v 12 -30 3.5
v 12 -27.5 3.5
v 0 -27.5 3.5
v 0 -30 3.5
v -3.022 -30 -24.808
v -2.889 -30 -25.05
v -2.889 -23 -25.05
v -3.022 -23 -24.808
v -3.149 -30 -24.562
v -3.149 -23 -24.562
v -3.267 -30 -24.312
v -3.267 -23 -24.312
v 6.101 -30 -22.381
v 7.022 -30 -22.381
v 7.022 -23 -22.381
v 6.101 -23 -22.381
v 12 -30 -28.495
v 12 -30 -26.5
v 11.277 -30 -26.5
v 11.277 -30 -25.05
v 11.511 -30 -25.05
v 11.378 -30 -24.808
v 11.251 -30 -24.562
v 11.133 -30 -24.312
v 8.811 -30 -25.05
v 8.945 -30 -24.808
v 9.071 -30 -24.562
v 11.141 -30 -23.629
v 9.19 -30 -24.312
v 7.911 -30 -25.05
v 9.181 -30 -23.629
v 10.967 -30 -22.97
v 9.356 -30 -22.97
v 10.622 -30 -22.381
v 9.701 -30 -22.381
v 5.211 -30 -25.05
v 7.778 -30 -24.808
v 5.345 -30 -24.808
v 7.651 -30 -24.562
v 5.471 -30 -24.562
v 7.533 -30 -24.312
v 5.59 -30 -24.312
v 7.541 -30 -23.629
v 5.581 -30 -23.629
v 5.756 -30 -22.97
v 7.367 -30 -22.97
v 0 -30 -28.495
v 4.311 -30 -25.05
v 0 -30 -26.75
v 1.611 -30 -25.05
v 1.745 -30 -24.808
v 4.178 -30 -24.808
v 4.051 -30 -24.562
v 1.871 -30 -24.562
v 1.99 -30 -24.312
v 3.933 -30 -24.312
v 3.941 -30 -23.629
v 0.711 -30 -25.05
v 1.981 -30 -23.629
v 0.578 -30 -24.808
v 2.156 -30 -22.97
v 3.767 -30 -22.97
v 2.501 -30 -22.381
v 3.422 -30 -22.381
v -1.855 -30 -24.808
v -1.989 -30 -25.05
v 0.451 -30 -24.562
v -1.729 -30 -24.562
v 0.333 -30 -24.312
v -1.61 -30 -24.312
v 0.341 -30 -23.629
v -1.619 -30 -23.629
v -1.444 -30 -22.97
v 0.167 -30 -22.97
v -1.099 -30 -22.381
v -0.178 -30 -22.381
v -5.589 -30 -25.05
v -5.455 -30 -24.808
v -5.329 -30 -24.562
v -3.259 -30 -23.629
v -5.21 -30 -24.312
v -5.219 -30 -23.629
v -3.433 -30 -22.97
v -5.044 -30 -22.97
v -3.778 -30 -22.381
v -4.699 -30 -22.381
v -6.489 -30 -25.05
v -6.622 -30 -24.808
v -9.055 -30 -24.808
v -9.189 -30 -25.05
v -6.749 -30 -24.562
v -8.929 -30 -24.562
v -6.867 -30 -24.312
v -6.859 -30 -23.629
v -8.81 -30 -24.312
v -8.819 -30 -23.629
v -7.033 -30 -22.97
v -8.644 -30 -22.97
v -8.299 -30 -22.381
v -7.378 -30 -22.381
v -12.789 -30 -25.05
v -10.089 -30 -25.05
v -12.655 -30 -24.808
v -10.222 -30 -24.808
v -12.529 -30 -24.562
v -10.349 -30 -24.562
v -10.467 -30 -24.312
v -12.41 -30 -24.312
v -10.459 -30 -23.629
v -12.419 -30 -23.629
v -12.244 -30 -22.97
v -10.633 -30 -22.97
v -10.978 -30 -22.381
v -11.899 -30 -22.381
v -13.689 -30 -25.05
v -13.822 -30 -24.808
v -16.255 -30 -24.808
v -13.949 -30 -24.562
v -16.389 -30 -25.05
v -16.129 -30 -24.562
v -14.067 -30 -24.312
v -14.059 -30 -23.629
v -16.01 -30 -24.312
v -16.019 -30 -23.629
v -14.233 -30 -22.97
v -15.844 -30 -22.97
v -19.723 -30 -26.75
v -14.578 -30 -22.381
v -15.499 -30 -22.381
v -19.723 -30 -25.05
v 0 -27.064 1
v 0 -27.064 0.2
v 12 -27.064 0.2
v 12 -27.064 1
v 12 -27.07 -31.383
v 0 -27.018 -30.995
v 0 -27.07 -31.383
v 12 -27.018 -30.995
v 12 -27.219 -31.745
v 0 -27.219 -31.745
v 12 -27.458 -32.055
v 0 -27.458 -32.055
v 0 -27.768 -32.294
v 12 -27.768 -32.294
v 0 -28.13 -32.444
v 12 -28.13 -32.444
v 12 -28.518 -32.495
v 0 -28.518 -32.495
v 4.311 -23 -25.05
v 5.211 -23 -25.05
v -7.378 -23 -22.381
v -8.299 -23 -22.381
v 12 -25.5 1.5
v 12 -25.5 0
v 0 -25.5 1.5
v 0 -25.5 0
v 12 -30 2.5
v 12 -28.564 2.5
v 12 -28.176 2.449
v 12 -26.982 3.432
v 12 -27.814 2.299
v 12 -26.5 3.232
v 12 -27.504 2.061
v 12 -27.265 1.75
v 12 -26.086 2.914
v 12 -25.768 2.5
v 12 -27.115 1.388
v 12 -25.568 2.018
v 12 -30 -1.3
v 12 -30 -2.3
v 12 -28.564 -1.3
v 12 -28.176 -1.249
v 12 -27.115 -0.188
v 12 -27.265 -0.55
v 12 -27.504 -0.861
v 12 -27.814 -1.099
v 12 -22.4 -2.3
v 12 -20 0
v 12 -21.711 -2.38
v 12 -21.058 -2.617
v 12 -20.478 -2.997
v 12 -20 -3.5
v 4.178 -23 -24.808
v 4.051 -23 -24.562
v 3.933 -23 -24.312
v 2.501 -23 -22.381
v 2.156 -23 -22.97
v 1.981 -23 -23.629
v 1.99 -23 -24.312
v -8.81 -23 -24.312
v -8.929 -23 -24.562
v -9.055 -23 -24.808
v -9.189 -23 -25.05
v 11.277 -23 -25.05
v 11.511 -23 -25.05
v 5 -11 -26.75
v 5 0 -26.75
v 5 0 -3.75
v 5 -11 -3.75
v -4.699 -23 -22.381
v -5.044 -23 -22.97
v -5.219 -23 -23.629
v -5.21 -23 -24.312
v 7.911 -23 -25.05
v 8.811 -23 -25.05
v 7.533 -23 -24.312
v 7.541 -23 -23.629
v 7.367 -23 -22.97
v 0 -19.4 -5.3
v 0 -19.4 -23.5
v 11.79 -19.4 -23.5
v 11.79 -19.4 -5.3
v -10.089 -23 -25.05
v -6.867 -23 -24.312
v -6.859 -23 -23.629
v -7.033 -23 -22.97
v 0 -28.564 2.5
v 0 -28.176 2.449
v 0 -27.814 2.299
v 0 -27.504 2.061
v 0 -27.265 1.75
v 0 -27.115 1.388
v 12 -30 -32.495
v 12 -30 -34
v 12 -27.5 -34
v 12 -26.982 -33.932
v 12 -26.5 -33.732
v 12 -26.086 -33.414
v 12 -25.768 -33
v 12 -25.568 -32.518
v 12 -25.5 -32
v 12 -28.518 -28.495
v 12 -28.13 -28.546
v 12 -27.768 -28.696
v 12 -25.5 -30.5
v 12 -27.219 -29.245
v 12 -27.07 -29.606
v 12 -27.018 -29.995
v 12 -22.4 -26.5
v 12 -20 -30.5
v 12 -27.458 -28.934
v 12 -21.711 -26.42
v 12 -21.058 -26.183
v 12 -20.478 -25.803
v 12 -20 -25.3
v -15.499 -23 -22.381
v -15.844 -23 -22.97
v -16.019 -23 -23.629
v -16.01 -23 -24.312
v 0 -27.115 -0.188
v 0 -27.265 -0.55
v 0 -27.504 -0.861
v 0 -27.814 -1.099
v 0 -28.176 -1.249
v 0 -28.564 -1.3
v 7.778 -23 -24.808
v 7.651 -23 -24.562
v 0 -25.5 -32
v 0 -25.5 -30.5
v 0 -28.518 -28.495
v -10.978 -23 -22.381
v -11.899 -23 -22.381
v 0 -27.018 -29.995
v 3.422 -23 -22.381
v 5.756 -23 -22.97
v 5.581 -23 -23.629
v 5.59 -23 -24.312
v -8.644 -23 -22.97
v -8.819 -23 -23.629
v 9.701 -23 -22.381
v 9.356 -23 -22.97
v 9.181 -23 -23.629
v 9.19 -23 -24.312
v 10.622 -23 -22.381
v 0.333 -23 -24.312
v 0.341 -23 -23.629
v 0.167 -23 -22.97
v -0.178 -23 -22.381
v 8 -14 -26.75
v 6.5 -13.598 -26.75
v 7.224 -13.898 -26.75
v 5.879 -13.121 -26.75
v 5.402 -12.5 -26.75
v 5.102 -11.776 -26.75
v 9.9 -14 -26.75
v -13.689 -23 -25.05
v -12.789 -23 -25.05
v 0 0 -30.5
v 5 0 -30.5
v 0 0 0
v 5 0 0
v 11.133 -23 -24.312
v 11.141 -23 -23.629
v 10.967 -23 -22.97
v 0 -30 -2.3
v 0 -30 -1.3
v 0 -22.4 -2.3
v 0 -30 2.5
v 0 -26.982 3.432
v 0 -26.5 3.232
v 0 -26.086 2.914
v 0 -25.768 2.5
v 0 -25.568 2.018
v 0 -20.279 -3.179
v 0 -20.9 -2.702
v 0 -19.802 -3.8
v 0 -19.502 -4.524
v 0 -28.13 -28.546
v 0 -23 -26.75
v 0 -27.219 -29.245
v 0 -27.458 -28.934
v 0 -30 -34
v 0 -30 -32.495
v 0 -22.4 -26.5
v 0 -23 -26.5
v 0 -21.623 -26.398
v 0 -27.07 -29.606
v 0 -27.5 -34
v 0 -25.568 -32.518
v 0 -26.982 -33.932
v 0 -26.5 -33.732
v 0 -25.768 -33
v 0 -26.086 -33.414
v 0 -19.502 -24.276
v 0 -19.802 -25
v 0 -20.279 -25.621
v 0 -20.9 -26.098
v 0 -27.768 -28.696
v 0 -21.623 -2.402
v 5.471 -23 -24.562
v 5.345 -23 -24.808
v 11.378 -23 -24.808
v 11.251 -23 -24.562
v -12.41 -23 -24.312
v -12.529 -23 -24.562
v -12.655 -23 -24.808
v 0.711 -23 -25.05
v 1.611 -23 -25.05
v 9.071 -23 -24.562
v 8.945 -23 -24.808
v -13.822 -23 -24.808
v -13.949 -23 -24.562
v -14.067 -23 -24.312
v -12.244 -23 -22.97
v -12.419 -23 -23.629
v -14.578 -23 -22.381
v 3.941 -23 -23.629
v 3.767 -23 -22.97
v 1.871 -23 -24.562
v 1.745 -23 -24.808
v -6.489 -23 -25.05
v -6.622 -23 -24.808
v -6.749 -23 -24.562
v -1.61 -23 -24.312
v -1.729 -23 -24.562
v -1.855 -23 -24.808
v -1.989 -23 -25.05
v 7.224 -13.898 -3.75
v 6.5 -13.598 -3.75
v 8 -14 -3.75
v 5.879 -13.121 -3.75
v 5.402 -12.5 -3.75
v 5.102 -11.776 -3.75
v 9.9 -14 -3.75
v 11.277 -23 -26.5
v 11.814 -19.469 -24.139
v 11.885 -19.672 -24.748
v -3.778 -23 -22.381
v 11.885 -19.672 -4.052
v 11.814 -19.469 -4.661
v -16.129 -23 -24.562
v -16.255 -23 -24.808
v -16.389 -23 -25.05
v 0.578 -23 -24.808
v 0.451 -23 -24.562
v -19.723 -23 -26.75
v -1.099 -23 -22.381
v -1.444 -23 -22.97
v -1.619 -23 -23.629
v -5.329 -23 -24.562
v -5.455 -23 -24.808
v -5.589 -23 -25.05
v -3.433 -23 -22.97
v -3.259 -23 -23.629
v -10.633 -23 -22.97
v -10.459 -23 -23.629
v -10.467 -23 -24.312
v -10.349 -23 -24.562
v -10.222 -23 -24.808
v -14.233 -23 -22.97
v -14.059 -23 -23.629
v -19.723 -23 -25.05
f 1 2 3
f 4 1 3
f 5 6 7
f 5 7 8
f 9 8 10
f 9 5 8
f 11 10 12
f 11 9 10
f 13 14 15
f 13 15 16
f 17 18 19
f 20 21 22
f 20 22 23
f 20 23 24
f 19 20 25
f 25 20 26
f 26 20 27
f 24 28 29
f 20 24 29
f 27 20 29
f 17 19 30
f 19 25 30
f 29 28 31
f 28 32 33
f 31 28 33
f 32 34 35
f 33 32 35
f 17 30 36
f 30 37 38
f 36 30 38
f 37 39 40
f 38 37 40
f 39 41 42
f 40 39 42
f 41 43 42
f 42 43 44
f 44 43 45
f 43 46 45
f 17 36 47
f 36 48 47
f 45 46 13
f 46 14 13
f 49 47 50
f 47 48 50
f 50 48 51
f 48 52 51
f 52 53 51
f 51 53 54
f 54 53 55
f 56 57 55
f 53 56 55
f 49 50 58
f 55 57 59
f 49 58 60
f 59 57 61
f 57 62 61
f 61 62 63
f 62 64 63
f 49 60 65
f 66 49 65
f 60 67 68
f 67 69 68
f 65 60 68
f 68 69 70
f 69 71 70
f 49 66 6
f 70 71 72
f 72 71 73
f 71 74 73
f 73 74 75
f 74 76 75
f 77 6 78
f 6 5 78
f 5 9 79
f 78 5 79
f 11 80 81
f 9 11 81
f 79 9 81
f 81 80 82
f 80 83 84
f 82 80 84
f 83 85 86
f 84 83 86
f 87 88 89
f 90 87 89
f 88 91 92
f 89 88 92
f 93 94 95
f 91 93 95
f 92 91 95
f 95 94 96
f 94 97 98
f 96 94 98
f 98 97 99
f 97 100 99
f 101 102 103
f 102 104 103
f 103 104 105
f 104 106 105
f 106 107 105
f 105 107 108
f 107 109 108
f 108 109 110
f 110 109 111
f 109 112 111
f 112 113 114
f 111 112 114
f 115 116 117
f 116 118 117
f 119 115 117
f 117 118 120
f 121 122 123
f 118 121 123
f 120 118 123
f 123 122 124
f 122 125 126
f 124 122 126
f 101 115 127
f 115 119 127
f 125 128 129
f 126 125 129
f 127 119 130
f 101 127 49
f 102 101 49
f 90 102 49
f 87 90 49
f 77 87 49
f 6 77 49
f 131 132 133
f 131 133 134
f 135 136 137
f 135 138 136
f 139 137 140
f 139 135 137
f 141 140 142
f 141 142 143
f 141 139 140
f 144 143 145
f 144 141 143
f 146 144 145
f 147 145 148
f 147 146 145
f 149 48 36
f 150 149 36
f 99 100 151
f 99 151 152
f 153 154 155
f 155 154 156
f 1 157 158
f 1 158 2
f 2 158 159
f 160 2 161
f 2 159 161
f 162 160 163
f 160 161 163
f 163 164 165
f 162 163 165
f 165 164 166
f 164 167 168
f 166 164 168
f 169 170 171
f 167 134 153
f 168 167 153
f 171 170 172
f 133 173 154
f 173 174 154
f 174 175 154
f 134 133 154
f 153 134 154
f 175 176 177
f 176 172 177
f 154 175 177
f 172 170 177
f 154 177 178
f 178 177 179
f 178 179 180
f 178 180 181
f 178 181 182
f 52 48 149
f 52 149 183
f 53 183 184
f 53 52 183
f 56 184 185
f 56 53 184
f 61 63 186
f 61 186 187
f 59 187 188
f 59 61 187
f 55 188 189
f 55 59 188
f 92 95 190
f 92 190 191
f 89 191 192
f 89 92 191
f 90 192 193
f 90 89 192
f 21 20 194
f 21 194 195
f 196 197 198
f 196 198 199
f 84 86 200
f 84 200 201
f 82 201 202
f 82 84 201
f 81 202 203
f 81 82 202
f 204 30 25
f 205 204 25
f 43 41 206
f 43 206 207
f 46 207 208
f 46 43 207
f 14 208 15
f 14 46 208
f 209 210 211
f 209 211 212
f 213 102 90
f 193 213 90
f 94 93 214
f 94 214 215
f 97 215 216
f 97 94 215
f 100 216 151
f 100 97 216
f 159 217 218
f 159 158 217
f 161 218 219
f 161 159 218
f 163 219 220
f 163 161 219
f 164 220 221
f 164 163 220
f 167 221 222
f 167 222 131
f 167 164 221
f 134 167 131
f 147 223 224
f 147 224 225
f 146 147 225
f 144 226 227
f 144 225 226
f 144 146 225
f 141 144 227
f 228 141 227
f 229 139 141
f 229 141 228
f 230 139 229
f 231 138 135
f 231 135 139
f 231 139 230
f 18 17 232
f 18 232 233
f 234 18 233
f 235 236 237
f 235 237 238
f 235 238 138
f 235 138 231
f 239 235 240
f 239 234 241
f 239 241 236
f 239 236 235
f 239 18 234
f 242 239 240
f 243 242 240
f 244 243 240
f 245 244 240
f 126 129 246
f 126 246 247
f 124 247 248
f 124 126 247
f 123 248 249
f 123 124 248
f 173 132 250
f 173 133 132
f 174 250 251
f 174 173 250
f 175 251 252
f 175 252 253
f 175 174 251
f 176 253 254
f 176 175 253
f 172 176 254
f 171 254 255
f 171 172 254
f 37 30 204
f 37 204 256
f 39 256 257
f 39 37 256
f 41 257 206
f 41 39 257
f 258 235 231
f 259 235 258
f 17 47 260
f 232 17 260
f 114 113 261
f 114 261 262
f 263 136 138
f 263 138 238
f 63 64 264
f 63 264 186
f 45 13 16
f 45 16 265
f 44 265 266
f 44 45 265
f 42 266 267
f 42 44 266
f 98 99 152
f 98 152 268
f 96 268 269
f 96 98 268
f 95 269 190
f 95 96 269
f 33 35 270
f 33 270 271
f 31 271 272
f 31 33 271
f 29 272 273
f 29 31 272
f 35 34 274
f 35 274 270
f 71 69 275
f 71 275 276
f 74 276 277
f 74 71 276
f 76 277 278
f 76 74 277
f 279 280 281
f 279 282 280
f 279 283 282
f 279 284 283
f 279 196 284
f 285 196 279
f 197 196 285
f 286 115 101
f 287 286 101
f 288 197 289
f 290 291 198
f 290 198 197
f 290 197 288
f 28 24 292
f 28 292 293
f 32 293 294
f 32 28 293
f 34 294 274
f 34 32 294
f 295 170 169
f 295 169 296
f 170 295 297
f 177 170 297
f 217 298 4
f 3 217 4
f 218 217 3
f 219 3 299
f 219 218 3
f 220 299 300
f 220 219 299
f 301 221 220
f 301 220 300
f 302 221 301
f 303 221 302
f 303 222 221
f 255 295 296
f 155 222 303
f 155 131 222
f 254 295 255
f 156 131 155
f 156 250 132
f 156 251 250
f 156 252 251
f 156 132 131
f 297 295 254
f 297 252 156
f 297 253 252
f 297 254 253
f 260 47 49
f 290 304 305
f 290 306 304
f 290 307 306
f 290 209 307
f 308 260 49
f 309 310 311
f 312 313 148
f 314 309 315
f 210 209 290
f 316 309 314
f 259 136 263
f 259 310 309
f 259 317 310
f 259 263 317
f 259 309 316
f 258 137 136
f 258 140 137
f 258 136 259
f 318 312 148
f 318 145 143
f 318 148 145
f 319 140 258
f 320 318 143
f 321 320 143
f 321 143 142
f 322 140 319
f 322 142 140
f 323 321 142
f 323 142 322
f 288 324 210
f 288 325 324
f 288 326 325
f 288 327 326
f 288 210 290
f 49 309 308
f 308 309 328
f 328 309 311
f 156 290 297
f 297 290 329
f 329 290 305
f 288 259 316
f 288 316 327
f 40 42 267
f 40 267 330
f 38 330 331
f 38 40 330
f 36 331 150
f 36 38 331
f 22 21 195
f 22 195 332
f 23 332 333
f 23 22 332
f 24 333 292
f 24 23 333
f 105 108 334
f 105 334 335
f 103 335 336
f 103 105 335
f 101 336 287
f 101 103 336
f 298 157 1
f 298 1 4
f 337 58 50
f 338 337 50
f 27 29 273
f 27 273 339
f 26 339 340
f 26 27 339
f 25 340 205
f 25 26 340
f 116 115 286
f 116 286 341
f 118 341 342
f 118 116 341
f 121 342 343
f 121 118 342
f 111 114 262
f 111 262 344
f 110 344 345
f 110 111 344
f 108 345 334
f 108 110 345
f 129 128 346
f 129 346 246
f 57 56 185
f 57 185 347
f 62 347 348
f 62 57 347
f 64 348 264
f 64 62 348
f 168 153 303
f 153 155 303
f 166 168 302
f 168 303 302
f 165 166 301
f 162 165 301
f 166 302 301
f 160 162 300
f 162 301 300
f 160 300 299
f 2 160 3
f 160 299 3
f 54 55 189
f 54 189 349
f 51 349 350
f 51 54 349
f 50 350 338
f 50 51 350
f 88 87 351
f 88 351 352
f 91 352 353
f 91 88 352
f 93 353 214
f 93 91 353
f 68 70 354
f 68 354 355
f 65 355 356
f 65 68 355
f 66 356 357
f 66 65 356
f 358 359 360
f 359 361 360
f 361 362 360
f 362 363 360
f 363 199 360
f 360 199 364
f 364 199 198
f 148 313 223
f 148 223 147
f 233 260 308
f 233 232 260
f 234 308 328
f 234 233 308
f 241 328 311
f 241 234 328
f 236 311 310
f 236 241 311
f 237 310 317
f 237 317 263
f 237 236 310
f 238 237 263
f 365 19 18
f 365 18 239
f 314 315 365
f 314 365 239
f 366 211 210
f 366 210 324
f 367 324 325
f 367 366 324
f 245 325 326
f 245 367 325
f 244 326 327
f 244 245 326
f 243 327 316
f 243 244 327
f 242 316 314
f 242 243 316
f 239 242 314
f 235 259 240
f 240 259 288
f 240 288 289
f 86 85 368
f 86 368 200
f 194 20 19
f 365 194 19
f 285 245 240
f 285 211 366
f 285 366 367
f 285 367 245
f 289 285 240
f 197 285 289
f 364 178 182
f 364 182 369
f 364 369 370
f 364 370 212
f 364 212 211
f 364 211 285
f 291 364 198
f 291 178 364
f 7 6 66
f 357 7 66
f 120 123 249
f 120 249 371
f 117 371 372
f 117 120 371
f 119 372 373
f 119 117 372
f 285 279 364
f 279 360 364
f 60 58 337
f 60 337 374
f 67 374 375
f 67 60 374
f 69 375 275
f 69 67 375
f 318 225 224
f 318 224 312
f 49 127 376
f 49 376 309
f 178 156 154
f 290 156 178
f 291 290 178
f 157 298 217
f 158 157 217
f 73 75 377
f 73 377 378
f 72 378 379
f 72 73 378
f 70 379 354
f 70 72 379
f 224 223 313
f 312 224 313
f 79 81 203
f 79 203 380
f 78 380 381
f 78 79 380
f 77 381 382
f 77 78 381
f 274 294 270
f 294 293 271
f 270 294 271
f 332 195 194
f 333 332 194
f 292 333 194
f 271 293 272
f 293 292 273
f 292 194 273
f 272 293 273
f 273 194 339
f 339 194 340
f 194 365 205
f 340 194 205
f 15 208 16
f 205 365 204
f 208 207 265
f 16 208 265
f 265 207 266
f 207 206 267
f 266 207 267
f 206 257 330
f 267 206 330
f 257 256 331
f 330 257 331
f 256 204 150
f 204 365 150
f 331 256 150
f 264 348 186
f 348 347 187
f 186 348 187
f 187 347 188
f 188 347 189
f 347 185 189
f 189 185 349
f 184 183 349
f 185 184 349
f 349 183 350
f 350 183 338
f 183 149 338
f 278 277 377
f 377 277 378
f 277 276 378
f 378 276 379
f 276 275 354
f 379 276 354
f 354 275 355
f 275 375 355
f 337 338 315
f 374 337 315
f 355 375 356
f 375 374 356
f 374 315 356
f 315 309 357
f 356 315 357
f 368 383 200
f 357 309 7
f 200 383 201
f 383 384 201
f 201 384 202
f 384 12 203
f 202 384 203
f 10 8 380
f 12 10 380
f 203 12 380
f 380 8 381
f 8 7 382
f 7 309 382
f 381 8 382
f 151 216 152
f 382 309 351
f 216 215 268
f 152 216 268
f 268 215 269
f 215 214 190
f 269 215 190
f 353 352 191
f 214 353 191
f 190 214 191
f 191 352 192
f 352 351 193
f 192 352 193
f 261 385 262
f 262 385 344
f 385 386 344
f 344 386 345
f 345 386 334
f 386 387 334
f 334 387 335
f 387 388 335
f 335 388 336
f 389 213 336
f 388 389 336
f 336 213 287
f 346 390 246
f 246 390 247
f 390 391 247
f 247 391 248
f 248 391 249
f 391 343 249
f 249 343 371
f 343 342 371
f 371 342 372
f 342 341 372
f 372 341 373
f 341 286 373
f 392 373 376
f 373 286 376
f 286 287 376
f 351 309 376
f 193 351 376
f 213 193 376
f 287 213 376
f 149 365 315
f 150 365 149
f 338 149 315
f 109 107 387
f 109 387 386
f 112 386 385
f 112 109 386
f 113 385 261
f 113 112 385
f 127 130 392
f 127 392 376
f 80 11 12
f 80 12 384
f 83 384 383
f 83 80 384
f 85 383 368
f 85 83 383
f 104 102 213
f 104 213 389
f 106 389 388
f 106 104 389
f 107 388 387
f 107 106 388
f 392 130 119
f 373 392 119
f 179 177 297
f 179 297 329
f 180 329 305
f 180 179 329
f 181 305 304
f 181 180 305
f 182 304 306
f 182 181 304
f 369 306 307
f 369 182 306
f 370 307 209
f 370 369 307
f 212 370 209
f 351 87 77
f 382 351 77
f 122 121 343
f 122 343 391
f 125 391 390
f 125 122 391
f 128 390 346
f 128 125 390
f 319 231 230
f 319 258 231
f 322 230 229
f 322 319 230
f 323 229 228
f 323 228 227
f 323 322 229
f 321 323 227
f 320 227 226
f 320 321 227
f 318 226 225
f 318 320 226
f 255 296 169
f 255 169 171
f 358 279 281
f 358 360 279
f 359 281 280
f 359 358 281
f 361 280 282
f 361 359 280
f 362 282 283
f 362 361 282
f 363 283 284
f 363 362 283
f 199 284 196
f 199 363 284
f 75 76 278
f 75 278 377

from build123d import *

# Parameters (mm, degrees)
BOSS_EXTRUDE1_DEPTH = 30.5
SKETCH4_W           = 24.2
SKETCH4_H           = 13
CUT_EXTRUDE2_DEPTH  = 25
CUT_EXTRUDE4_DEPTH  = 11.5
SKETCH7_W           = 31
SKETCH7_H           = 1.7
BOSS_EXTRUDE3_DEPTH = 7
BOSS_EXTRUDE4_DEPTH = 7
LPATTERN1_COUNT     = 8
LPATTERN1_PITCH     = 3.6
SKETCH11_W          = 12
SKETCH11_H          = 4.5
BOSS_EXTRUDE5_DEPTH = 3.5
FILLET1_R           = 2
FILLET2_R           = 2
FILLET5_R           = 3
SKETCH12_W          = 4
SKETCH12_H          = 3.5
SKETCH12_W_2        = 3.8
CUT_EXTRUDE5_DEPTH  = 12
FILLET6_R           = 1.5


with BuildPart() as part:
    # Sketch1 → Boss-Extrude1 (new body)
    with BuildSketch(Plane.XY):
        Polygon((0, 0), (0, -30), (12, -30), (12, -20), (5, 0), align=None)
    extrude(amount=-BOSS_EXTRUDE1_DEPTH)

    # Sketch4 → Cut-Extrude2 (cut)
    with BuildSketch(Plane.ZY):
        with Locations((-14.4, -25.899949695)):
            Rectangle(SKETCH4_W, SKETCH4_H)
    extrude(amount=-CUT_EXTRUDE2_DEPTH, mode=Mode.SUBTRACT)

    # Sketch6 → Cut-Extrude4 (cut, symmetric)
    with BuildSketch(Plane.XY.offset(-15.25)):
        Polygon((5, 0), (5, -14), (9.9, -14), align=None)
    extrude(amount=CUT_EXTRUDE4_DEPTH, both=True, mode=Mode.SUBTRACT)

    # Sketch7 → Boss-Extrude3 (add)
    with BuildSketch(Plane(origin=(0, -30, 0), x_dir=(1, 0, 0), z_dir=(0, 1, 0))):
        with Locations((-4.2231607, 25.9)):
            Rectangle(SKETCH7_W, SKETCH7_H)
    extrude(amount=BOSS_EXTRUDE3_DEPTH)

    # Sketch10 → Boss-Extrude4 (add)
    with BuildSketch(Plane(origin=(0, -30, 0), x_dir=(1, 0, 0), z_dir=(0, 1, 0))):
        with BuildLine():
            Line((10.621636646, 22.381188189), (9.701086249, 22.381188189))
            ThreePointArc((9.701086249, 22.381188189), (9.246170102, 23.293637842), (9.190157183, 24.311663197))
            ThreePointArc((9.190157183, 24.311663197), (9.009091816, 24.685106498), (8.811361447, 25.05))
            Line((8.811361447, 25.05), (11.511361447, 25.05))
            ThreePointArc((11.511361447, 25.05), (11.313631078, 24.685106498), (11.132565711, 24.311663197))
            ThreePointArc((11.132565711, 24.311663197), (11.076552792, 23.293637842), (10.621636646, 22.381188189))
        make_face()
    boss_extrude4 = extrude(amount=BOSS_EXTRUDE4_DEPTH)

    # LPattern1: Boss-Extrude4 ×8
    with Locations(*[(-i * LPATTERN1_PITCH, 0, 0) for i in range(1, LPATTERN1_COUNT)]):
        add(boss_extrude4)

    # Sketch11 → Boss-Extrude5 (add)
    with BuildSketch(Plane(origin=(0, 0, -30.5), x_dir=(-1, 0, 0), z_dir=(0, 0, -1))):
        with Locations((-6, -27.75)):
            Rectangle(SKETCH11_W, SKETCH11_H)
    boss_extrude5 = extrude(amount=BOSS_EXTRUDE5_DEPTH)

    # Fillet1
    fillet1_edges = [part.edges().sort_by_distance(p)[0] for p in [
        (6, -25.5, -34),
    ]]
    fillet(fillet1_edges, radius=FILLET1_R)

    # Mirror1: Boss-Extrude5 across plane
    add(boss_extrude5.mirror(Plane.XY.offset(-15.25)))

    # Fillet2
    fillet2_edges = [part.edges().sort_by_distance(p)[0] for p in [
        (6, -25.5, 3.5),
    ]]
    fillet(fillet2_edges, radius=FILLET2_R)

    # Fillet5
    fillet5_edges = [part.edges().sort_by_distance(p)[0] for p in [
        (5, -14, -15.25),
        (5.894991197, -19.399949695, -2.3),
        (5.894991197, -19.399949695, -26.5),
    ]]
    fillet(fillet5_edges, radius=FILLET5_R)

    # Sketch12 → Cut-Extrude5 (cut)
    with BuildSketch(Plane.ZY):
        with Locations((-30.494628275, -28.768411502)):
            Rectangle(SKETCH12_W, SKETCH12_H)
        with Locations((0.6, -28.814354386)):
            Rectangle(SKETCH12_W_2, SKETCH12_H)
    extrude(amount=-CUT_EXTRUDE5_DEPTH, mode=Mode.SUBTRACT)

    # Fillet6
    fillet6_edges = [part.edges().sort_by_distance(p)[0] for p in [
        (6, -27.018411502, -28.494628275),
        (6, -27.018411502, -32.494628275),
        (6, -27.064354386, -1.3),
        (6, -27.064354386, 2.5),
    ]]
    fillet(fillet6_edges, radius=FILLET6_R)


solid = part.part
